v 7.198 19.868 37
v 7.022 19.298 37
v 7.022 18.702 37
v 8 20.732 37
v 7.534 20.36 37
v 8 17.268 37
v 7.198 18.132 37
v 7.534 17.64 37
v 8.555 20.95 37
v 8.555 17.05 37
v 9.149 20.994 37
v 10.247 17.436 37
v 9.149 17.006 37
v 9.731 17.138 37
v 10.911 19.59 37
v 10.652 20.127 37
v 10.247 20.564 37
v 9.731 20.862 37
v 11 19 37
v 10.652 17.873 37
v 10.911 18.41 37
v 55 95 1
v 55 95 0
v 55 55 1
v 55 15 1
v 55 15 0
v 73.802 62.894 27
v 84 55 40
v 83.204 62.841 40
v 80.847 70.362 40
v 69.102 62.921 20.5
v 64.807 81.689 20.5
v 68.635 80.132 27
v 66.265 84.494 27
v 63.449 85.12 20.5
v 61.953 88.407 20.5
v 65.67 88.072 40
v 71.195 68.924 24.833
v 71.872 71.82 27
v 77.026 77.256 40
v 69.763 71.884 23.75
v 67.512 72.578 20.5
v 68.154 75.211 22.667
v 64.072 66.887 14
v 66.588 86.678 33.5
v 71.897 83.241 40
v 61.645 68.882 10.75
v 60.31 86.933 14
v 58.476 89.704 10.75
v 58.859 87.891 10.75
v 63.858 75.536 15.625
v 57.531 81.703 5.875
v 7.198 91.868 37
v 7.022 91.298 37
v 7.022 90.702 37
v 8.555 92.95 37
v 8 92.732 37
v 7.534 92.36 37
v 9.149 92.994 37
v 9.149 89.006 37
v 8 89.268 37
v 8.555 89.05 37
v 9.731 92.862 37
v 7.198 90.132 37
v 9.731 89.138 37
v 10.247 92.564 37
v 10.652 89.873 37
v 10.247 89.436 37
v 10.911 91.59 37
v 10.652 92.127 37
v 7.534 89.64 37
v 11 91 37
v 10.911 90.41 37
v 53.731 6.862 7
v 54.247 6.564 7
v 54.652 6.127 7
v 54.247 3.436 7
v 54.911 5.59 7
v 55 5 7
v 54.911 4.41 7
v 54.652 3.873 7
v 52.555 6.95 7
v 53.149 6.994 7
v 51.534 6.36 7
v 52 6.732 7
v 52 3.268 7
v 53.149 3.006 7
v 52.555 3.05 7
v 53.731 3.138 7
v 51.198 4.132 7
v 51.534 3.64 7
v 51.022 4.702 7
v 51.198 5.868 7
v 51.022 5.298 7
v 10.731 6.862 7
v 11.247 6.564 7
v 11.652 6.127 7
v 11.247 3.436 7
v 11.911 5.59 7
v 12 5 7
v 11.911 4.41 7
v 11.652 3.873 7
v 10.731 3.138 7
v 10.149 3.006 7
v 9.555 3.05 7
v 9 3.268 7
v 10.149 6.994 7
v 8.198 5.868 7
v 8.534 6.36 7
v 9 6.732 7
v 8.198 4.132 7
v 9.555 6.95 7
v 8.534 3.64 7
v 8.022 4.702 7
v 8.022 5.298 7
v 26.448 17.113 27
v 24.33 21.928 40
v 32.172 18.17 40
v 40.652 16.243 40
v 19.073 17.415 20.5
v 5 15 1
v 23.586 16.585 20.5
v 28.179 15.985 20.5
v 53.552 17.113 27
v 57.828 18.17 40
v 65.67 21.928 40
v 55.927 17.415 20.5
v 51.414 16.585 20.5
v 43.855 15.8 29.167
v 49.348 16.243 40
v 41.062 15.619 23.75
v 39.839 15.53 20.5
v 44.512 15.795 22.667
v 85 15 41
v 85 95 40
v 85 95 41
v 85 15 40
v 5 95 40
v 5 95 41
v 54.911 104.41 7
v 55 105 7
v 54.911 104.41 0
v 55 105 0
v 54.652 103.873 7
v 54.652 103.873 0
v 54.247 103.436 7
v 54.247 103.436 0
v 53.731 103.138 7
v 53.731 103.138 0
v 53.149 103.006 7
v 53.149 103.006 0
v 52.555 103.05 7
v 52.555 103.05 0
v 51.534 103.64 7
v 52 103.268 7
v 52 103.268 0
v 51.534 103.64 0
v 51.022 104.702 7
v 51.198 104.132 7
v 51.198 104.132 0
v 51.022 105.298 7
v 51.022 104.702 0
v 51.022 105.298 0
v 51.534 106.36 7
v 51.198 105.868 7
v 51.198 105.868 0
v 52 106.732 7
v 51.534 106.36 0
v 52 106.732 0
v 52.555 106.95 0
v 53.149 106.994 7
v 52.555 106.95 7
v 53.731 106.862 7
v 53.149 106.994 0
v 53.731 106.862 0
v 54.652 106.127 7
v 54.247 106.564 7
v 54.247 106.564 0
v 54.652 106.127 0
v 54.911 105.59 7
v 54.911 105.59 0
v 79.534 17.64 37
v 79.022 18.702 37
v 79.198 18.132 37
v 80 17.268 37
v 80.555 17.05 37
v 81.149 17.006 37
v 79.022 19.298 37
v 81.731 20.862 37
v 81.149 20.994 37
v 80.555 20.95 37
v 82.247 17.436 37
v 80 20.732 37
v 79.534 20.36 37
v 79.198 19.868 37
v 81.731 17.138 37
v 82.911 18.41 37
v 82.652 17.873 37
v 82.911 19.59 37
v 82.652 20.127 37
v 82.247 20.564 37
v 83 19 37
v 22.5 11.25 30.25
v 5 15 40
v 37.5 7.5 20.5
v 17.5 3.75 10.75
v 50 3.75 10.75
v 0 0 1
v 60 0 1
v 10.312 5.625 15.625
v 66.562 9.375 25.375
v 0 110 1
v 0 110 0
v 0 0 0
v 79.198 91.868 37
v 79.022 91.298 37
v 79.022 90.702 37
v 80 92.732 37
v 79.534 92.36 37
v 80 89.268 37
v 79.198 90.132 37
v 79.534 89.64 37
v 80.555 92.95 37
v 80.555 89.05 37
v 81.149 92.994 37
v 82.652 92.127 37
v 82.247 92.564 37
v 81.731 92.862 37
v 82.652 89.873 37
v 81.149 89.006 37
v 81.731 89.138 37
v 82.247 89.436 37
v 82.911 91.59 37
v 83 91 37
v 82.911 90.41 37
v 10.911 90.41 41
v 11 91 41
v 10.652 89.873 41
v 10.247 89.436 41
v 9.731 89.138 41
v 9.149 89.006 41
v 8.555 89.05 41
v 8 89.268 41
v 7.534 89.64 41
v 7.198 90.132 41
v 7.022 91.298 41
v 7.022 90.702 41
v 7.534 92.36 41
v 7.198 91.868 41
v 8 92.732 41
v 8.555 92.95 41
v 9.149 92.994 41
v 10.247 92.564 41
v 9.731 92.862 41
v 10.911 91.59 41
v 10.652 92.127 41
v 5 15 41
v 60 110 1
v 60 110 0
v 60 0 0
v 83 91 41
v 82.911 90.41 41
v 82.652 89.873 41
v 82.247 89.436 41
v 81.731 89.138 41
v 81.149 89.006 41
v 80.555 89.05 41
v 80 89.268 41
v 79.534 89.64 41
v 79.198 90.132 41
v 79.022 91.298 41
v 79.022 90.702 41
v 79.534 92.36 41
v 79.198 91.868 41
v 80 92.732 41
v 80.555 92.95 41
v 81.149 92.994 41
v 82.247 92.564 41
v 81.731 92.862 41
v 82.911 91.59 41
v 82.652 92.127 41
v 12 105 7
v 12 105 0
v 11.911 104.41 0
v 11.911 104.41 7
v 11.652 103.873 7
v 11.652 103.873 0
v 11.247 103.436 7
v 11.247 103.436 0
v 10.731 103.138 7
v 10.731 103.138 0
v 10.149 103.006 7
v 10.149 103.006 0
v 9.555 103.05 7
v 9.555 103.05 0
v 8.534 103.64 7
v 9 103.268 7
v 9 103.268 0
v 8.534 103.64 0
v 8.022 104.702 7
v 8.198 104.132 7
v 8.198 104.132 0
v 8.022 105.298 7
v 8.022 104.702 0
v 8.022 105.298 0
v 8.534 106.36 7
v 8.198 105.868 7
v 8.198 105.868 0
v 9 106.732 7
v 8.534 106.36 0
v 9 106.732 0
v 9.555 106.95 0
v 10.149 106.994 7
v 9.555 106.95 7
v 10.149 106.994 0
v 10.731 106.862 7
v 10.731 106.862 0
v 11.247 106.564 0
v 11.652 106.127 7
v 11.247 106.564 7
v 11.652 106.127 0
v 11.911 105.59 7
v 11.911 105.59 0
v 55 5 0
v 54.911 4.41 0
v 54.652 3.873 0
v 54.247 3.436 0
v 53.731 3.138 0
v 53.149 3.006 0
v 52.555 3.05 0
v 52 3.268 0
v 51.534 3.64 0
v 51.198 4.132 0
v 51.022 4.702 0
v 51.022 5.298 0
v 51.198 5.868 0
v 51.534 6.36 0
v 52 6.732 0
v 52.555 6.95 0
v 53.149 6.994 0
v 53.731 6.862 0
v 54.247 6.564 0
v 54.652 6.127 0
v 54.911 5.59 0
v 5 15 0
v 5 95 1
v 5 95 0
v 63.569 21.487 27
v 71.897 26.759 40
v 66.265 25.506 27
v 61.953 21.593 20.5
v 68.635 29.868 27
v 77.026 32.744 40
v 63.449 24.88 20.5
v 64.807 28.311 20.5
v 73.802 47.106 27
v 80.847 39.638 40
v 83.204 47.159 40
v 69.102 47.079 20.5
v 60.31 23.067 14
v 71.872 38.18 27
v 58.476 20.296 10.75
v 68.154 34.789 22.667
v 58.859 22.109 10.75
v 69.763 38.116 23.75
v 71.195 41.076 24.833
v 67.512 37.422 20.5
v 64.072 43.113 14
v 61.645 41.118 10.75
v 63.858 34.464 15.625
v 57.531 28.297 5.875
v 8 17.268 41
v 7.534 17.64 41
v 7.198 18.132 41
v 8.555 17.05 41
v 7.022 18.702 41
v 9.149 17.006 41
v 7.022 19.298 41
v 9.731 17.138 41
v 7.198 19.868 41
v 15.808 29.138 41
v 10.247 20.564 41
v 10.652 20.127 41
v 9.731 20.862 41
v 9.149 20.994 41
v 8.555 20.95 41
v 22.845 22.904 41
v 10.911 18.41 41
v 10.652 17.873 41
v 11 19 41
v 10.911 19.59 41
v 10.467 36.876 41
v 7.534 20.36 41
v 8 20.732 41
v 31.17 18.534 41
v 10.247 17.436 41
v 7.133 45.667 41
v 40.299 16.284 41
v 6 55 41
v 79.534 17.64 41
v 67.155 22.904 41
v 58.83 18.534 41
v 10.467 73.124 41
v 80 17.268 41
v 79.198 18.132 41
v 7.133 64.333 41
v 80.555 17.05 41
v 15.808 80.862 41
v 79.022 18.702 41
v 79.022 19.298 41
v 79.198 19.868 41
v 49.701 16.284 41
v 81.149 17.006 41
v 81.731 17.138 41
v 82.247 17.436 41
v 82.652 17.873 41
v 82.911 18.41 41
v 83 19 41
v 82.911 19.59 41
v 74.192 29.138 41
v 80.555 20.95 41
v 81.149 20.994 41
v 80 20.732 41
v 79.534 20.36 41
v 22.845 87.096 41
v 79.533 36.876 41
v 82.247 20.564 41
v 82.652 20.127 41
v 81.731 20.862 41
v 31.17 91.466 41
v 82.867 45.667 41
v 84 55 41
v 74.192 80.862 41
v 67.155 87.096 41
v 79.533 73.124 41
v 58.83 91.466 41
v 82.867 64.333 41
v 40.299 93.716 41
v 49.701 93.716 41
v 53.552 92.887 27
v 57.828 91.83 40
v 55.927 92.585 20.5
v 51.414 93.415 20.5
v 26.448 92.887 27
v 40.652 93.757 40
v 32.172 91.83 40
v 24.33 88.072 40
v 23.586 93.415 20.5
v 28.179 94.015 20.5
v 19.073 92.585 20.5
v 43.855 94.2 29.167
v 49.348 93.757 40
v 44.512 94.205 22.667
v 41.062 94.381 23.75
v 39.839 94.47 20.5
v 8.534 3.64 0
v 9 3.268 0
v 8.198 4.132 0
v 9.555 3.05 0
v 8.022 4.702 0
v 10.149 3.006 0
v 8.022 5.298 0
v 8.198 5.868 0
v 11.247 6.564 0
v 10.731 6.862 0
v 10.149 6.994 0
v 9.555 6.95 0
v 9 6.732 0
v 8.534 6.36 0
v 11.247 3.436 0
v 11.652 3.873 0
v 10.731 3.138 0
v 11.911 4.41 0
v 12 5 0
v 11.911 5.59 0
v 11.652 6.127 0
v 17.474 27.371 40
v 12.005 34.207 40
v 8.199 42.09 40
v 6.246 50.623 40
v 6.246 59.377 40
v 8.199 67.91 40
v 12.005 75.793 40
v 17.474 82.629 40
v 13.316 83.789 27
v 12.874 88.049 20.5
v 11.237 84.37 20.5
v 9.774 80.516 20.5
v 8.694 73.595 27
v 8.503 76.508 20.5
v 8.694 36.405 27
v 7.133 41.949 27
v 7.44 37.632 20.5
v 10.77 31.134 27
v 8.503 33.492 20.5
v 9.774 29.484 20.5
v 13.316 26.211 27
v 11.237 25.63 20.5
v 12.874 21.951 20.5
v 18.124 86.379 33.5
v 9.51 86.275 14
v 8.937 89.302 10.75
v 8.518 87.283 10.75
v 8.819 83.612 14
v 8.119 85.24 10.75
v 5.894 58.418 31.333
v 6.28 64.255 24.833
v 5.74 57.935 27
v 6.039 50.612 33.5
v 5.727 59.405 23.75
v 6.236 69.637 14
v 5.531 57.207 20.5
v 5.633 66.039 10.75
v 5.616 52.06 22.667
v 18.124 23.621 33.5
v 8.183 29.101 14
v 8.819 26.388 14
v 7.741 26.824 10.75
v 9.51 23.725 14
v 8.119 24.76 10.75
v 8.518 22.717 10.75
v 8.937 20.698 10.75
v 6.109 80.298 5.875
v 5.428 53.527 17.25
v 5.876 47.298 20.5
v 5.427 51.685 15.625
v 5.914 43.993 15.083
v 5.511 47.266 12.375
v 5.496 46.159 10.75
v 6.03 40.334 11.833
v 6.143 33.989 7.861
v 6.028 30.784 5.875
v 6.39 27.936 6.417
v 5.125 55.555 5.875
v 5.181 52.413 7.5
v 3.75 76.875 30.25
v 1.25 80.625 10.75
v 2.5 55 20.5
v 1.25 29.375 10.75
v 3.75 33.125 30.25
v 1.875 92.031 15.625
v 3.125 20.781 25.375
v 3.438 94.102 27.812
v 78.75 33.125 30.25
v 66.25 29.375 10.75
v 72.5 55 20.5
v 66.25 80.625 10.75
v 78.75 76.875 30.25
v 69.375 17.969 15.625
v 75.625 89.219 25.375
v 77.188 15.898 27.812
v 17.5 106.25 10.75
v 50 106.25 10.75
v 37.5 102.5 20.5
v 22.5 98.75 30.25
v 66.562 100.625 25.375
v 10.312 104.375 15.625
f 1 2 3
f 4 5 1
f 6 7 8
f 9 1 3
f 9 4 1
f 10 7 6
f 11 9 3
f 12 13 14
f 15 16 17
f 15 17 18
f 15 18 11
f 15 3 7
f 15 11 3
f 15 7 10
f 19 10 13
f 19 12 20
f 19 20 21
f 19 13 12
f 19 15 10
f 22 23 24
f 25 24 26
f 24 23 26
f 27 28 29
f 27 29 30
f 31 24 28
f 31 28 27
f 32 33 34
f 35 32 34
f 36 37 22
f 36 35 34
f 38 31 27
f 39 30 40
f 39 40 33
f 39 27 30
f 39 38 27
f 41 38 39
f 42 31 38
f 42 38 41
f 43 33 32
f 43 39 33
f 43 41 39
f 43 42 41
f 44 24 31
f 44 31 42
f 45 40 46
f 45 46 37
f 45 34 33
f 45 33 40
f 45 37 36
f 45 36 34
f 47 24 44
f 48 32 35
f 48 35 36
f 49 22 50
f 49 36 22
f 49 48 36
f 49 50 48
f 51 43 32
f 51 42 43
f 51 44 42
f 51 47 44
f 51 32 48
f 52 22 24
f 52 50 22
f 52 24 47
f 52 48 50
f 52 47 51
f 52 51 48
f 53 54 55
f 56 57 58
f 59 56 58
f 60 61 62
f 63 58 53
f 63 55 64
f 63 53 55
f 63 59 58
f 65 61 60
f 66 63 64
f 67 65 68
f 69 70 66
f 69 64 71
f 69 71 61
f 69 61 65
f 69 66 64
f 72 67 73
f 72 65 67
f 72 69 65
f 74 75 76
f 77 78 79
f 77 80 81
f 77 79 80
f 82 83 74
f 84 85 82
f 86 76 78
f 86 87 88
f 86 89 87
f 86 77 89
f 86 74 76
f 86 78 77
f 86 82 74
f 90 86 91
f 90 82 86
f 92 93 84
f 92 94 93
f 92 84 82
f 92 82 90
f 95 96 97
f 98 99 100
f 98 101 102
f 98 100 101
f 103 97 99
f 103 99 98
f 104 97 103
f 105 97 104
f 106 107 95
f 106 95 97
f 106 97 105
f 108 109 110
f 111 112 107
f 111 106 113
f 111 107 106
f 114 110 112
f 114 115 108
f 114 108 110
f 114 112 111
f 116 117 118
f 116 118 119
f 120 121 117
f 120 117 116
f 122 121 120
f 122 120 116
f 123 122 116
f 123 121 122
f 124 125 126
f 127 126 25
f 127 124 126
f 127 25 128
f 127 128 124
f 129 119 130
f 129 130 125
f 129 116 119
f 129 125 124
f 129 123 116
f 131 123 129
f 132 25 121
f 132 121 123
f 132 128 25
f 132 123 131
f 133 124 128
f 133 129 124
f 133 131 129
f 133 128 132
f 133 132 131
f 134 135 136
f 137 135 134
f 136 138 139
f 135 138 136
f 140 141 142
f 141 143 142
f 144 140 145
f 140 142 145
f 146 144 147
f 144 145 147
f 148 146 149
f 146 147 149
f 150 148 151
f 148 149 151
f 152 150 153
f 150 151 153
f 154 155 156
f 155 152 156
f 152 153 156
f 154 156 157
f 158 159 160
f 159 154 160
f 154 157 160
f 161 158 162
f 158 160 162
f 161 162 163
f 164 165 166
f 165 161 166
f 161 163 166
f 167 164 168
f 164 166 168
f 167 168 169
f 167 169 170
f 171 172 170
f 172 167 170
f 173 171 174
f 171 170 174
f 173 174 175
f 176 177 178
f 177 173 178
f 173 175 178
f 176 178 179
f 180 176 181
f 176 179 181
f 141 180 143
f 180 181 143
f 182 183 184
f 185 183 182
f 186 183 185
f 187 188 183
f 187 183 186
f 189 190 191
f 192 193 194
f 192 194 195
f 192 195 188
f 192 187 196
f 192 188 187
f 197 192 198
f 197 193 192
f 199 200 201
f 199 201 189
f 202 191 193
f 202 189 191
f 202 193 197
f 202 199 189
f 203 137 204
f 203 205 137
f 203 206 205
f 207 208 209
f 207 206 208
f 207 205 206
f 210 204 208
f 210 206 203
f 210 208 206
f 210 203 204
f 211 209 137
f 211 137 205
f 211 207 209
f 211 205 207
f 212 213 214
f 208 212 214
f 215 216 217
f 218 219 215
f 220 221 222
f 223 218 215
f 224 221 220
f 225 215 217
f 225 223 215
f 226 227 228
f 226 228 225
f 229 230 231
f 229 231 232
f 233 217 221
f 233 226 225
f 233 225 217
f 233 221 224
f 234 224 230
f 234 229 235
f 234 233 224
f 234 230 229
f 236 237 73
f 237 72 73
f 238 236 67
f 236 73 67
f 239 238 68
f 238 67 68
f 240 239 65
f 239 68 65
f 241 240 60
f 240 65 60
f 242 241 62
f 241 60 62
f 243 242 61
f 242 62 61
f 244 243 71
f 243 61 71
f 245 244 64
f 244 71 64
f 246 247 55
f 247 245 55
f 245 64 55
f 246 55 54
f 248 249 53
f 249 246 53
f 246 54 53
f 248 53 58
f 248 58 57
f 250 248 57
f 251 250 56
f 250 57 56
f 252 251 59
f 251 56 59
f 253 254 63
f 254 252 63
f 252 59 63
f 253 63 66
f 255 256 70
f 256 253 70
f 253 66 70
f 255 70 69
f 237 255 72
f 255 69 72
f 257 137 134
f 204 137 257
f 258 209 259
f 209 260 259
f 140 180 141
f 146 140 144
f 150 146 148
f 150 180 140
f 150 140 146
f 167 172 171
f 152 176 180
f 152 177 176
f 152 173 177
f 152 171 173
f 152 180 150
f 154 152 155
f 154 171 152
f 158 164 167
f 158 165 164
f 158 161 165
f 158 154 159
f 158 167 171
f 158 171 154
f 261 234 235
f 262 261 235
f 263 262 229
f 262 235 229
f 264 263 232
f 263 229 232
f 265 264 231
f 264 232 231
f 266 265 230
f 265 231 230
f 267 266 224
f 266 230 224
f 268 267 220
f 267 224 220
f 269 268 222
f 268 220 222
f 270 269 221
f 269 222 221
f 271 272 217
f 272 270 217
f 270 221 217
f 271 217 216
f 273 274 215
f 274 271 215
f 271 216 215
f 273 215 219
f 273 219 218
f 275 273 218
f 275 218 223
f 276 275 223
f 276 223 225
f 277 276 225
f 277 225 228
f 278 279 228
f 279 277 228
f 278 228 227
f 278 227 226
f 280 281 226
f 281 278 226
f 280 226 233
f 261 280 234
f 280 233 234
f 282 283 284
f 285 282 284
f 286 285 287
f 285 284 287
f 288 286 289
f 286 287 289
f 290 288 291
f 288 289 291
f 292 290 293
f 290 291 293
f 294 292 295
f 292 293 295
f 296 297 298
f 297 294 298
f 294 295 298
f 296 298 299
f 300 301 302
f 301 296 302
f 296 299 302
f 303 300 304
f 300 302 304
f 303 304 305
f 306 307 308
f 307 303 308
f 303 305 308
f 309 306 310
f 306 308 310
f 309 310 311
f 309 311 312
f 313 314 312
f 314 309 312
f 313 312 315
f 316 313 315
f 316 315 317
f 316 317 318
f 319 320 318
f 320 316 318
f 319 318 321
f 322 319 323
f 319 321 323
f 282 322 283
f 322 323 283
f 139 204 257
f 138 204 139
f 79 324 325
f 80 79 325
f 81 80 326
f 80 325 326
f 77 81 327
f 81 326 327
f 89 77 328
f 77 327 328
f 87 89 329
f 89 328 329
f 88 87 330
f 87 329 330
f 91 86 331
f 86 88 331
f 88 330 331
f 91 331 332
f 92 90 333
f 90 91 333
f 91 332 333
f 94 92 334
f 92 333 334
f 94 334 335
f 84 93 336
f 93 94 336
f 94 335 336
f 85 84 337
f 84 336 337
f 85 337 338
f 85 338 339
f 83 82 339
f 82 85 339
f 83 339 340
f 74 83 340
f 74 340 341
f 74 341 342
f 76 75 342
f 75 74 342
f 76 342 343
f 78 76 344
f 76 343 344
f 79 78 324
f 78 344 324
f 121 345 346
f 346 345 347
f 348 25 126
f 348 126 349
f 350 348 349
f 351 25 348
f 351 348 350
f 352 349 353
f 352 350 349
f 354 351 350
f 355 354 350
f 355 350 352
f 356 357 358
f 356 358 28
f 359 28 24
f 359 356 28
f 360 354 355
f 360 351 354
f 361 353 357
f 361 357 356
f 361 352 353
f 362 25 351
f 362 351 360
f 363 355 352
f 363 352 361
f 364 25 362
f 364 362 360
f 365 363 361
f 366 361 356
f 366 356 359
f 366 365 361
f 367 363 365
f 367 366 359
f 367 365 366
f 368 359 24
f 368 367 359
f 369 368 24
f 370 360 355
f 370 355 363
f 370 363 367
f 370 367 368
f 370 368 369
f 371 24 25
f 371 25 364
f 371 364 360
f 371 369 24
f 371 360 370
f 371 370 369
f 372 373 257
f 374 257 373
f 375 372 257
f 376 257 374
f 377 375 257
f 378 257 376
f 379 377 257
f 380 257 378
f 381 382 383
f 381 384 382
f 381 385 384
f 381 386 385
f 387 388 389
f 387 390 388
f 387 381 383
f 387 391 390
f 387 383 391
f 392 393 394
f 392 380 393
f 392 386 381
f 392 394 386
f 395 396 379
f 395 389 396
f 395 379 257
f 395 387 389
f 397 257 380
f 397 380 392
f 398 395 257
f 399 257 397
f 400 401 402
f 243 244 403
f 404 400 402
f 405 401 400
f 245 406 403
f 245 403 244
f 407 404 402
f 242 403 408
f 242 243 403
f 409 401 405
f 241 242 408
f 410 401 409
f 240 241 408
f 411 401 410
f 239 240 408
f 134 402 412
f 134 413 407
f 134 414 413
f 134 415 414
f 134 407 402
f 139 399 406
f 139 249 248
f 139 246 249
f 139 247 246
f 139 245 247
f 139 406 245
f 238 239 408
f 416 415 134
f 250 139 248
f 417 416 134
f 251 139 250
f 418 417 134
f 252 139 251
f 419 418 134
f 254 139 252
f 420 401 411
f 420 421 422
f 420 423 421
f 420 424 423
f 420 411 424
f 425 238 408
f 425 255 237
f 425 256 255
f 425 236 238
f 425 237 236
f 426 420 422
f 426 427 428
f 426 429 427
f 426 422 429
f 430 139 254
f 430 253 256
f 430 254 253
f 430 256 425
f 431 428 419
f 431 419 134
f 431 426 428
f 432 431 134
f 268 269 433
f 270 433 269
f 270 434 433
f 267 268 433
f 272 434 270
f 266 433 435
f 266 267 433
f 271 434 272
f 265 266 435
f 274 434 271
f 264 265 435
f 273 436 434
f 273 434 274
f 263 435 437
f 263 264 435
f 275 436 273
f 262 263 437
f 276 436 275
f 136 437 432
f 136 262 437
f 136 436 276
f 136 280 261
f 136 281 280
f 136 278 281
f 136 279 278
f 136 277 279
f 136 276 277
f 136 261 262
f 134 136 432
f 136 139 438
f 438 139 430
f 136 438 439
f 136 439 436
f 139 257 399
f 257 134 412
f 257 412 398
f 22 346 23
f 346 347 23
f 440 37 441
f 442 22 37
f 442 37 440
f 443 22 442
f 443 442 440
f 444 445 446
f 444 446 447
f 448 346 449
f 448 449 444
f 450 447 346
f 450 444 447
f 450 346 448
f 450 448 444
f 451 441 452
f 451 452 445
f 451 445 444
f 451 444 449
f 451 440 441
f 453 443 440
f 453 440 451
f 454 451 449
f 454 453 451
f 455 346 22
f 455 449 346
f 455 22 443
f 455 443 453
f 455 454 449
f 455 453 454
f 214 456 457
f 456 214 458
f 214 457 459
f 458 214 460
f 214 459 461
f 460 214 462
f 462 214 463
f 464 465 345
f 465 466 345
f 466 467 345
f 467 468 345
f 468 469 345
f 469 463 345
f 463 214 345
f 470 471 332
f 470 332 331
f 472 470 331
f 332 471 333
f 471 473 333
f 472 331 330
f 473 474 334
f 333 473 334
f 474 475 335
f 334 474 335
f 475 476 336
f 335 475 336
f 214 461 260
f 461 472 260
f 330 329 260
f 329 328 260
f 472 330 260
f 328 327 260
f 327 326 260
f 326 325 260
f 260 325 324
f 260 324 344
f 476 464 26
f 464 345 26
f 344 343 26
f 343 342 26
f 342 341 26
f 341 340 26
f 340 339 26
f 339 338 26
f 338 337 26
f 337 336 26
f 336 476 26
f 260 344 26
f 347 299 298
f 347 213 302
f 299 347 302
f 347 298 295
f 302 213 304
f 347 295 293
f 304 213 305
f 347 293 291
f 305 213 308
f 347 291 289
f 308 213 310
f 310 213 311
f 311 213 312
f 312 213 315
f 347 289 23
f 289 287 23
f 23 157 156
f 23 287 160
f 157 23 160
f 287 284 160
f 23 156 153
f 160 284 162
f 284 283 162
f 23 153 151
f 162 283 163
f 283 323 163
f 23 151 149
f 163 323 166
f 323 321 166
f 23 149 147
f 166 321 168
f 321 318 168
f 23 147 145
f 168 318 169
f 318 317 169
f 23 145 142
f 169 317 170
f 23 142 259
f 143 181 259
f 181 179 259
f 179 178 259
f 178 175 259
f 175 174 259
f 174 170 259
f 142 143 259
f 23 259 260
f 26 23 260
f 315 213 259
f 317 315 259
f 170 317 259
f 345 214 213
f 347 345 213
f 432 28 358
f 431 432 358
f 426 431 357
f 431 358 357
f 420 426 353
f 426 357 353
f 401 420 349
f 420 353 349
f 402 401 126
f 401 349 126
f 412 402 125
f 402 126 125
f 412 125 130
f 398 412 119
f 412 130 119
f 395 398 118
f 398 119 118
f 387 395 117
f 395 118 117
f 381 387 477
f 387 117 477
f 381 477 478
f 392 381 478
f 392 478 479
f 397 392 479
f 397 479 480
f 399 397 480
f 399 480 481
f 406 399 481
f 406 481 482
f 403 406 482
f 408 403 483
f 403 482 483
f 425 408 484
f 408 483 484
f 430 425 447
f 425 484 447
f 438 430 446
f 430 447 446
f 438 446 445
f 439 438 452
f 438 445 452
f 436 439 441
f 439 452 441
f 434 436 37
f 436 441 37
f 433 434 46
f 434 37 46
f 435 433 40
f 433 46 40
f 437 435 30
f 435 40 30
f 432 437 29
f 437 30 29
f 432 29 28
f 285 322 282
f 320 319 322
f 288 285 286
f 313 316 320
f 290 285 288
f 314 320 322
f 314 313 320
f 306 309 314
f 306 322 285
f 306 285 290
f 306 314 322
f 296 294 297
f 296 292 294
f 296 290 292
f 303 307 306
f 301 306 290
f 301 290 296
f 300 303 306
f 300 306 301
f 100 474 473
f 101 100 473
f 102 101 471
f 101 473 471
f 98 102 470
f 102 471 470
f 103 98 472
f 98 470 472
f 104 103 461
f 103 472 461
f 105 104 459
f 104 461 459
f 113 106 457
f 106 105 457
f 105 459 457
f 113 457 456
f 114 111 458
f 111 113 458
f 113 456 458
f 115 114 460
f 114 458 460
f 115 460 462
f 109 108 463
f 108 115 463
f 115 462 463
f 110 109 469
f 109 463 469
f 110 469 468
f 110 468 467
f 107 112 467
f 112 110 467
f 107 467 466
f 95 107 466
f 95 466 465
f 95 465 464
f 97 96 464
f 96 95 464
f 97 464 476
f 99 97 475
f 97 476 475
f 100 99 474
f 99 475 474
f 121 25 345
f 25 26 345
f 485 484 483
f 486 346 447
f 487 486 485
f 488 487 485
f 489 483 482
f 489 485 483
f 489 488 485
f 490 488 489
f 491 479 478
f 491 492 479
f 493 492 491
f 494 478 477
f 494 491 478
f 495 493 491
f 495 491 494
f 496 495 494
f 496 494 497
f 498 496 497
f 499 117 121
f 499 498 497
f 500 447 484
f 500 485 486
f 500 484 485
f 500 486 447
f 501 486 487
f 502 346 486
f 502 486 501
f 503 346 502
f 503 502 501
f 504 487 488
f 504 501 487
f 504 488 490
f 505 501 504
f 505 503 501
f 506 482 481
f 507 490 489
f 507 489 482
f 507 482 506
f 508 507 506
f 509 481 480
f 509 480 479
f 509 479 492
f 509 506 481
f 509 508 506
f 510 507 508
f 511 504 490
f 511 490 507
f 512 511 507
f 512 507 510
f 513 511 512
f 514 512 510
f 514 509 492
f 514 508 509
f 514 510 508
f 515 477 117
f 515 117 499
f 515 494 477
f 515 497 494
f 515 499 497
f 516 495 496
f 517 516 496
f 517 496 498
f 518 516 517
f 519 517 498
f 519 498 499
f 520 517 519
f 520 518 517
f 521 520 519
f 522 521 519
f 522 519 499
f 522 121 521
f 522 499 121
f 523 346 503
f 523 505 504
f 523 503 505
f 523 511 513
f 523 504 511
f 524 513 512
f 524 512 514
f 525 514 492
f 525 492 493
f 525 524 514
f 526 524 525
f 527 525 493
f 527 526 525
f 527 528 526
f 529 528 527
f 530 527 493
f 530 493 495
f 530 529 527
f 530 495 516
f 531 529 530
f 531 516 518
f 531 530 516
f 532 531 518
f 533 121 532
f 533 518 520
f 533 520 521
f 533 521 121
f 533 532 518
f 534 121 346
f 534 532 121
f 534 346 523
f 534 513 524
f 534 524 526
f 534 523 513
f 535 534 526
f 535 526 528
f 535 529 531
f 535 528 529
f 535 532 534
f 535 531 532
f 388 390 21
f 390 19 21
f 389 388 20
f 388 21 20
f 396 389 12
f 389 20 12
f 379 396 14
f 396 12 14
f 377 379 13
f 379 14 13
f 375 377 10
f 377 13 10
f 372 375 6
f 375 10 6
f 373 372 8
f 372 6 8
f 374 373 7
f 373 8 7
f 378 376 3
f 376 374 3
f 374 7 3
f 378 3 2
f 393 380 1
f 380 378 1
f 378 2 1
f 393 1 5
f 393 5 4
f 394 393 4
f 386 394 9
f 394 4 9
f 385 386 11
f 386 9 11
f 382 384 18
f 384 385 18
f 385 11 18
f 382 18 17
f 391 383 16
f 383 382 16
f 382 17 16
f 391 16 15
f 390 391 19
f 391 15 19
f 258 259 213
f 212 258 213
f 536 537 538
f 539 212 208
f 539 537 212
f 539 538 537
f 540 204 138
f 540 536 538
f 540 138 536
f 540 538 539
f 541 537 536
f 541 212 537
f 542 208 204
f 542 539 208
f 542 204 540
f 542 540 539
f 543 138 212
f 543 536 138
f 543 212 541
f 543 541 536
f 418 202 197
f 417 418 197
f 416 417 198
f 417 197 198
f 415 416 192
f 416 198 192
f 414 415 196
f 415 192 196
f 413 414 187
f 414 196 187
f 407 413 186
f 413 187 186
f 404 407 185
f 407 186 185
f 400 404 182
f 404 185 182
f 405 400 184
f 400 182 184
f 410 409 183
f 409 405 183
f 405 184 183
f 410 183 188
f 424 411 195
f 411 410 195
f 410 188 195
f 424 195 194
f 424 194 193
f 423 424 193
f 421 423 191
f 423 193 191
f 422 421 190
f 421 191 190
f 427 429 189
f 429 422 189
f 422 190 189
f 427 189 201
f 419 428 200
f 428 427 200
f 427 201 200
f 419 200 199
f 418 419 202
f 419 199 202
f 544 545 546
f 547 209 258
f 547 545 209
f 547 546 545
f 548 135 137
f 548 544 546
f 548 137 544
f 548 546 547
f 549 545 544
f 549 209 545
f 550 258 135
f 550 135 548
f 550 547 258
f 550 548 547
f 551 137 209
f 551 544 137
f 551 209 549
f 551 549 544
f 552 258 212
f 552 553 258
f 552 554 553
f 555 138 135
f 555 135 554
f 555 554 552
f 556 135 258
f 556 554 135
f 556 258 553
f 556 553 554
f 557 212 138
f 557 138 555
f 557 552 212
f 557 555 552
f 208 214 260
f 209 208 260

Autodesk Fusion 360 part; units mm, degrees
sketch "Skizze1" plane through (0, 0, 0) normal (0, 0, 1) x (1, 0, 0)
  line L0 (0, 0) -> (60, 0)
  line L1 (60, 0) -> (60, 110)
  line L2 (60, 110) -> (0, 110)
  line L3 (0, 110) -> (0, 0)
  circle A0 centre (10, 105) radius 2
  circle A1 centre (53, 105) radius 2
  circle A2 centre (10, 5) radius 2
  circle A3 centre (53, 5) radius 2
  line L4 (5, 95) -> (55, 95)
  line L5 (55, 95) -> (55, 15)
  line L6 (55, 15) -> (5, 15)
  line L7 (5, 15) -> (5, 95)
  dimension "d1" = 60
  dimension "d2" = 110
  dimension "d3" = 43
  dimension "d4" = 100
  dimension "d5" = 4
  dimension "d6" = 4
  dimension "d7" = 4
  dimension "d8" = 4
  dimension "d9" = 50
  dimension "d10" = 80
ref_plane "Arbeitsebene1" through (30, 55, 40) normal (0, 0, 1) x (1, 0, 0)
sketch "Skizze2" plane through (0, 0, 40) normal (0, 0, 1) x (1, 0, 0)
  line L0 (5, 95) -> (85, 95)
  line L1 (85, 95) -> (85, 15)
  line L2 (85, 15) -> (5, 15)
  line L3 (5, 15) -> (5, 95)
  circle A0 centre (81, 19) radius 2
  circle A1 centre (9, 19) radius 2
  circle A2 centre (9, 91) radius 2
  circle A3 centre (81, 91) radius 2
  circle A4 centre (45, 55) radius 39
  dimension "d12" = 80
  dimension "d13" = 80
  dimension "d14" = 72
  dimension "d15" = 72
  dimension "d18" = 4
  dimension "d19" = 4
  dimension "d20" = 4
  dimension "d21" = 4
  dimension "d22" = 78
extrude "Extrusion1" add sketch "Skizze2" along normal blind 1 makes body 1
extrude "Extrusion2" add sketch "Skizze1" along normal blind 1 separate body makes body 2
sketch "Skizze3" plane through (0, 0, 1) normal (0, 0, 1) x (-1, 0, 0)
  circle A0 centre (-53, -5) radius 2
  circle A1 centre (-10, -105) radius 2
  line L0 (-55, -15) -> (-5, -15)
  line L1 (-5, -15) -> (-5, -95)
  line L2 (-5, -95) -> (-55, -95)
  line L3 (-55, -95) -> (-55, -15)
  circle A2 centre (-10, -5) radius 2
  circle A3 centre (-53, -105) radius 2
  line L4 (0, -110) -> (0, 0)
  line L5 (0, 0) -> (-60, 0)
  line L6 (-60, 0) -> (-60, -110)
  line L7 (-60, -110) -> (0, -110)
  line L8 (-5, -95) -> (-55, -95)
  line L9 (-55, -95) -> (-55, -15)
  line L10 (-55, -15) -> (-5, -15)
  line L11 (-5, -15) -> (-5, -95)
sketch "Skizze4" plane through (0, 0, 40) normal (0, 0, -1) x (1, 0, 0)
  circle A0 centre (9, -91) radius 2
  circle A1 centre (9, -19) radius 2
  circle A2 centre (45, -55) radius 39
  circle A3 centre (81, -91) radius 2
  circle A4 centre (81, -19) radius 2
  line L0 (85, -15) -> (5, -15)
  line L1 (5, -15) -> (5, -95)
  line L2 (5, -95) -> (85, -95)
  line L3 (85, -95) -> (85, -15)
  circle A5 centre (45, -55) radius 39
loft "Erhebung1" add profiles "Skizze3", "Skizze4" section 1 section 2 bodies 1 2
loft "Erhebung2" cut section 1 face at (50.4593, 44.7073, 40) section 2 face at (38.3333, 68.3333, 1) on bodies 1 bodies 1
extrude "Extrusion3" cut 4 faces at (9.0794, 18.5317, 40) (9.5113, 91.1239, 40) (80.8813, 90.5466, 40) (80.1558, 20.1279, 40) along direction (0, 0, -1) blind 3 on bodies 1 bodies 1
extrude "Extrusion4" cut 4 faces at (52.3408, 5.0994, 1) (53.6332, 104.277, 1) (10.637, 103.8966, 1) (10.4521, 6.4238, 1) along direction (0, 0, 1) blind 6 on bodies 1 bodies 1
